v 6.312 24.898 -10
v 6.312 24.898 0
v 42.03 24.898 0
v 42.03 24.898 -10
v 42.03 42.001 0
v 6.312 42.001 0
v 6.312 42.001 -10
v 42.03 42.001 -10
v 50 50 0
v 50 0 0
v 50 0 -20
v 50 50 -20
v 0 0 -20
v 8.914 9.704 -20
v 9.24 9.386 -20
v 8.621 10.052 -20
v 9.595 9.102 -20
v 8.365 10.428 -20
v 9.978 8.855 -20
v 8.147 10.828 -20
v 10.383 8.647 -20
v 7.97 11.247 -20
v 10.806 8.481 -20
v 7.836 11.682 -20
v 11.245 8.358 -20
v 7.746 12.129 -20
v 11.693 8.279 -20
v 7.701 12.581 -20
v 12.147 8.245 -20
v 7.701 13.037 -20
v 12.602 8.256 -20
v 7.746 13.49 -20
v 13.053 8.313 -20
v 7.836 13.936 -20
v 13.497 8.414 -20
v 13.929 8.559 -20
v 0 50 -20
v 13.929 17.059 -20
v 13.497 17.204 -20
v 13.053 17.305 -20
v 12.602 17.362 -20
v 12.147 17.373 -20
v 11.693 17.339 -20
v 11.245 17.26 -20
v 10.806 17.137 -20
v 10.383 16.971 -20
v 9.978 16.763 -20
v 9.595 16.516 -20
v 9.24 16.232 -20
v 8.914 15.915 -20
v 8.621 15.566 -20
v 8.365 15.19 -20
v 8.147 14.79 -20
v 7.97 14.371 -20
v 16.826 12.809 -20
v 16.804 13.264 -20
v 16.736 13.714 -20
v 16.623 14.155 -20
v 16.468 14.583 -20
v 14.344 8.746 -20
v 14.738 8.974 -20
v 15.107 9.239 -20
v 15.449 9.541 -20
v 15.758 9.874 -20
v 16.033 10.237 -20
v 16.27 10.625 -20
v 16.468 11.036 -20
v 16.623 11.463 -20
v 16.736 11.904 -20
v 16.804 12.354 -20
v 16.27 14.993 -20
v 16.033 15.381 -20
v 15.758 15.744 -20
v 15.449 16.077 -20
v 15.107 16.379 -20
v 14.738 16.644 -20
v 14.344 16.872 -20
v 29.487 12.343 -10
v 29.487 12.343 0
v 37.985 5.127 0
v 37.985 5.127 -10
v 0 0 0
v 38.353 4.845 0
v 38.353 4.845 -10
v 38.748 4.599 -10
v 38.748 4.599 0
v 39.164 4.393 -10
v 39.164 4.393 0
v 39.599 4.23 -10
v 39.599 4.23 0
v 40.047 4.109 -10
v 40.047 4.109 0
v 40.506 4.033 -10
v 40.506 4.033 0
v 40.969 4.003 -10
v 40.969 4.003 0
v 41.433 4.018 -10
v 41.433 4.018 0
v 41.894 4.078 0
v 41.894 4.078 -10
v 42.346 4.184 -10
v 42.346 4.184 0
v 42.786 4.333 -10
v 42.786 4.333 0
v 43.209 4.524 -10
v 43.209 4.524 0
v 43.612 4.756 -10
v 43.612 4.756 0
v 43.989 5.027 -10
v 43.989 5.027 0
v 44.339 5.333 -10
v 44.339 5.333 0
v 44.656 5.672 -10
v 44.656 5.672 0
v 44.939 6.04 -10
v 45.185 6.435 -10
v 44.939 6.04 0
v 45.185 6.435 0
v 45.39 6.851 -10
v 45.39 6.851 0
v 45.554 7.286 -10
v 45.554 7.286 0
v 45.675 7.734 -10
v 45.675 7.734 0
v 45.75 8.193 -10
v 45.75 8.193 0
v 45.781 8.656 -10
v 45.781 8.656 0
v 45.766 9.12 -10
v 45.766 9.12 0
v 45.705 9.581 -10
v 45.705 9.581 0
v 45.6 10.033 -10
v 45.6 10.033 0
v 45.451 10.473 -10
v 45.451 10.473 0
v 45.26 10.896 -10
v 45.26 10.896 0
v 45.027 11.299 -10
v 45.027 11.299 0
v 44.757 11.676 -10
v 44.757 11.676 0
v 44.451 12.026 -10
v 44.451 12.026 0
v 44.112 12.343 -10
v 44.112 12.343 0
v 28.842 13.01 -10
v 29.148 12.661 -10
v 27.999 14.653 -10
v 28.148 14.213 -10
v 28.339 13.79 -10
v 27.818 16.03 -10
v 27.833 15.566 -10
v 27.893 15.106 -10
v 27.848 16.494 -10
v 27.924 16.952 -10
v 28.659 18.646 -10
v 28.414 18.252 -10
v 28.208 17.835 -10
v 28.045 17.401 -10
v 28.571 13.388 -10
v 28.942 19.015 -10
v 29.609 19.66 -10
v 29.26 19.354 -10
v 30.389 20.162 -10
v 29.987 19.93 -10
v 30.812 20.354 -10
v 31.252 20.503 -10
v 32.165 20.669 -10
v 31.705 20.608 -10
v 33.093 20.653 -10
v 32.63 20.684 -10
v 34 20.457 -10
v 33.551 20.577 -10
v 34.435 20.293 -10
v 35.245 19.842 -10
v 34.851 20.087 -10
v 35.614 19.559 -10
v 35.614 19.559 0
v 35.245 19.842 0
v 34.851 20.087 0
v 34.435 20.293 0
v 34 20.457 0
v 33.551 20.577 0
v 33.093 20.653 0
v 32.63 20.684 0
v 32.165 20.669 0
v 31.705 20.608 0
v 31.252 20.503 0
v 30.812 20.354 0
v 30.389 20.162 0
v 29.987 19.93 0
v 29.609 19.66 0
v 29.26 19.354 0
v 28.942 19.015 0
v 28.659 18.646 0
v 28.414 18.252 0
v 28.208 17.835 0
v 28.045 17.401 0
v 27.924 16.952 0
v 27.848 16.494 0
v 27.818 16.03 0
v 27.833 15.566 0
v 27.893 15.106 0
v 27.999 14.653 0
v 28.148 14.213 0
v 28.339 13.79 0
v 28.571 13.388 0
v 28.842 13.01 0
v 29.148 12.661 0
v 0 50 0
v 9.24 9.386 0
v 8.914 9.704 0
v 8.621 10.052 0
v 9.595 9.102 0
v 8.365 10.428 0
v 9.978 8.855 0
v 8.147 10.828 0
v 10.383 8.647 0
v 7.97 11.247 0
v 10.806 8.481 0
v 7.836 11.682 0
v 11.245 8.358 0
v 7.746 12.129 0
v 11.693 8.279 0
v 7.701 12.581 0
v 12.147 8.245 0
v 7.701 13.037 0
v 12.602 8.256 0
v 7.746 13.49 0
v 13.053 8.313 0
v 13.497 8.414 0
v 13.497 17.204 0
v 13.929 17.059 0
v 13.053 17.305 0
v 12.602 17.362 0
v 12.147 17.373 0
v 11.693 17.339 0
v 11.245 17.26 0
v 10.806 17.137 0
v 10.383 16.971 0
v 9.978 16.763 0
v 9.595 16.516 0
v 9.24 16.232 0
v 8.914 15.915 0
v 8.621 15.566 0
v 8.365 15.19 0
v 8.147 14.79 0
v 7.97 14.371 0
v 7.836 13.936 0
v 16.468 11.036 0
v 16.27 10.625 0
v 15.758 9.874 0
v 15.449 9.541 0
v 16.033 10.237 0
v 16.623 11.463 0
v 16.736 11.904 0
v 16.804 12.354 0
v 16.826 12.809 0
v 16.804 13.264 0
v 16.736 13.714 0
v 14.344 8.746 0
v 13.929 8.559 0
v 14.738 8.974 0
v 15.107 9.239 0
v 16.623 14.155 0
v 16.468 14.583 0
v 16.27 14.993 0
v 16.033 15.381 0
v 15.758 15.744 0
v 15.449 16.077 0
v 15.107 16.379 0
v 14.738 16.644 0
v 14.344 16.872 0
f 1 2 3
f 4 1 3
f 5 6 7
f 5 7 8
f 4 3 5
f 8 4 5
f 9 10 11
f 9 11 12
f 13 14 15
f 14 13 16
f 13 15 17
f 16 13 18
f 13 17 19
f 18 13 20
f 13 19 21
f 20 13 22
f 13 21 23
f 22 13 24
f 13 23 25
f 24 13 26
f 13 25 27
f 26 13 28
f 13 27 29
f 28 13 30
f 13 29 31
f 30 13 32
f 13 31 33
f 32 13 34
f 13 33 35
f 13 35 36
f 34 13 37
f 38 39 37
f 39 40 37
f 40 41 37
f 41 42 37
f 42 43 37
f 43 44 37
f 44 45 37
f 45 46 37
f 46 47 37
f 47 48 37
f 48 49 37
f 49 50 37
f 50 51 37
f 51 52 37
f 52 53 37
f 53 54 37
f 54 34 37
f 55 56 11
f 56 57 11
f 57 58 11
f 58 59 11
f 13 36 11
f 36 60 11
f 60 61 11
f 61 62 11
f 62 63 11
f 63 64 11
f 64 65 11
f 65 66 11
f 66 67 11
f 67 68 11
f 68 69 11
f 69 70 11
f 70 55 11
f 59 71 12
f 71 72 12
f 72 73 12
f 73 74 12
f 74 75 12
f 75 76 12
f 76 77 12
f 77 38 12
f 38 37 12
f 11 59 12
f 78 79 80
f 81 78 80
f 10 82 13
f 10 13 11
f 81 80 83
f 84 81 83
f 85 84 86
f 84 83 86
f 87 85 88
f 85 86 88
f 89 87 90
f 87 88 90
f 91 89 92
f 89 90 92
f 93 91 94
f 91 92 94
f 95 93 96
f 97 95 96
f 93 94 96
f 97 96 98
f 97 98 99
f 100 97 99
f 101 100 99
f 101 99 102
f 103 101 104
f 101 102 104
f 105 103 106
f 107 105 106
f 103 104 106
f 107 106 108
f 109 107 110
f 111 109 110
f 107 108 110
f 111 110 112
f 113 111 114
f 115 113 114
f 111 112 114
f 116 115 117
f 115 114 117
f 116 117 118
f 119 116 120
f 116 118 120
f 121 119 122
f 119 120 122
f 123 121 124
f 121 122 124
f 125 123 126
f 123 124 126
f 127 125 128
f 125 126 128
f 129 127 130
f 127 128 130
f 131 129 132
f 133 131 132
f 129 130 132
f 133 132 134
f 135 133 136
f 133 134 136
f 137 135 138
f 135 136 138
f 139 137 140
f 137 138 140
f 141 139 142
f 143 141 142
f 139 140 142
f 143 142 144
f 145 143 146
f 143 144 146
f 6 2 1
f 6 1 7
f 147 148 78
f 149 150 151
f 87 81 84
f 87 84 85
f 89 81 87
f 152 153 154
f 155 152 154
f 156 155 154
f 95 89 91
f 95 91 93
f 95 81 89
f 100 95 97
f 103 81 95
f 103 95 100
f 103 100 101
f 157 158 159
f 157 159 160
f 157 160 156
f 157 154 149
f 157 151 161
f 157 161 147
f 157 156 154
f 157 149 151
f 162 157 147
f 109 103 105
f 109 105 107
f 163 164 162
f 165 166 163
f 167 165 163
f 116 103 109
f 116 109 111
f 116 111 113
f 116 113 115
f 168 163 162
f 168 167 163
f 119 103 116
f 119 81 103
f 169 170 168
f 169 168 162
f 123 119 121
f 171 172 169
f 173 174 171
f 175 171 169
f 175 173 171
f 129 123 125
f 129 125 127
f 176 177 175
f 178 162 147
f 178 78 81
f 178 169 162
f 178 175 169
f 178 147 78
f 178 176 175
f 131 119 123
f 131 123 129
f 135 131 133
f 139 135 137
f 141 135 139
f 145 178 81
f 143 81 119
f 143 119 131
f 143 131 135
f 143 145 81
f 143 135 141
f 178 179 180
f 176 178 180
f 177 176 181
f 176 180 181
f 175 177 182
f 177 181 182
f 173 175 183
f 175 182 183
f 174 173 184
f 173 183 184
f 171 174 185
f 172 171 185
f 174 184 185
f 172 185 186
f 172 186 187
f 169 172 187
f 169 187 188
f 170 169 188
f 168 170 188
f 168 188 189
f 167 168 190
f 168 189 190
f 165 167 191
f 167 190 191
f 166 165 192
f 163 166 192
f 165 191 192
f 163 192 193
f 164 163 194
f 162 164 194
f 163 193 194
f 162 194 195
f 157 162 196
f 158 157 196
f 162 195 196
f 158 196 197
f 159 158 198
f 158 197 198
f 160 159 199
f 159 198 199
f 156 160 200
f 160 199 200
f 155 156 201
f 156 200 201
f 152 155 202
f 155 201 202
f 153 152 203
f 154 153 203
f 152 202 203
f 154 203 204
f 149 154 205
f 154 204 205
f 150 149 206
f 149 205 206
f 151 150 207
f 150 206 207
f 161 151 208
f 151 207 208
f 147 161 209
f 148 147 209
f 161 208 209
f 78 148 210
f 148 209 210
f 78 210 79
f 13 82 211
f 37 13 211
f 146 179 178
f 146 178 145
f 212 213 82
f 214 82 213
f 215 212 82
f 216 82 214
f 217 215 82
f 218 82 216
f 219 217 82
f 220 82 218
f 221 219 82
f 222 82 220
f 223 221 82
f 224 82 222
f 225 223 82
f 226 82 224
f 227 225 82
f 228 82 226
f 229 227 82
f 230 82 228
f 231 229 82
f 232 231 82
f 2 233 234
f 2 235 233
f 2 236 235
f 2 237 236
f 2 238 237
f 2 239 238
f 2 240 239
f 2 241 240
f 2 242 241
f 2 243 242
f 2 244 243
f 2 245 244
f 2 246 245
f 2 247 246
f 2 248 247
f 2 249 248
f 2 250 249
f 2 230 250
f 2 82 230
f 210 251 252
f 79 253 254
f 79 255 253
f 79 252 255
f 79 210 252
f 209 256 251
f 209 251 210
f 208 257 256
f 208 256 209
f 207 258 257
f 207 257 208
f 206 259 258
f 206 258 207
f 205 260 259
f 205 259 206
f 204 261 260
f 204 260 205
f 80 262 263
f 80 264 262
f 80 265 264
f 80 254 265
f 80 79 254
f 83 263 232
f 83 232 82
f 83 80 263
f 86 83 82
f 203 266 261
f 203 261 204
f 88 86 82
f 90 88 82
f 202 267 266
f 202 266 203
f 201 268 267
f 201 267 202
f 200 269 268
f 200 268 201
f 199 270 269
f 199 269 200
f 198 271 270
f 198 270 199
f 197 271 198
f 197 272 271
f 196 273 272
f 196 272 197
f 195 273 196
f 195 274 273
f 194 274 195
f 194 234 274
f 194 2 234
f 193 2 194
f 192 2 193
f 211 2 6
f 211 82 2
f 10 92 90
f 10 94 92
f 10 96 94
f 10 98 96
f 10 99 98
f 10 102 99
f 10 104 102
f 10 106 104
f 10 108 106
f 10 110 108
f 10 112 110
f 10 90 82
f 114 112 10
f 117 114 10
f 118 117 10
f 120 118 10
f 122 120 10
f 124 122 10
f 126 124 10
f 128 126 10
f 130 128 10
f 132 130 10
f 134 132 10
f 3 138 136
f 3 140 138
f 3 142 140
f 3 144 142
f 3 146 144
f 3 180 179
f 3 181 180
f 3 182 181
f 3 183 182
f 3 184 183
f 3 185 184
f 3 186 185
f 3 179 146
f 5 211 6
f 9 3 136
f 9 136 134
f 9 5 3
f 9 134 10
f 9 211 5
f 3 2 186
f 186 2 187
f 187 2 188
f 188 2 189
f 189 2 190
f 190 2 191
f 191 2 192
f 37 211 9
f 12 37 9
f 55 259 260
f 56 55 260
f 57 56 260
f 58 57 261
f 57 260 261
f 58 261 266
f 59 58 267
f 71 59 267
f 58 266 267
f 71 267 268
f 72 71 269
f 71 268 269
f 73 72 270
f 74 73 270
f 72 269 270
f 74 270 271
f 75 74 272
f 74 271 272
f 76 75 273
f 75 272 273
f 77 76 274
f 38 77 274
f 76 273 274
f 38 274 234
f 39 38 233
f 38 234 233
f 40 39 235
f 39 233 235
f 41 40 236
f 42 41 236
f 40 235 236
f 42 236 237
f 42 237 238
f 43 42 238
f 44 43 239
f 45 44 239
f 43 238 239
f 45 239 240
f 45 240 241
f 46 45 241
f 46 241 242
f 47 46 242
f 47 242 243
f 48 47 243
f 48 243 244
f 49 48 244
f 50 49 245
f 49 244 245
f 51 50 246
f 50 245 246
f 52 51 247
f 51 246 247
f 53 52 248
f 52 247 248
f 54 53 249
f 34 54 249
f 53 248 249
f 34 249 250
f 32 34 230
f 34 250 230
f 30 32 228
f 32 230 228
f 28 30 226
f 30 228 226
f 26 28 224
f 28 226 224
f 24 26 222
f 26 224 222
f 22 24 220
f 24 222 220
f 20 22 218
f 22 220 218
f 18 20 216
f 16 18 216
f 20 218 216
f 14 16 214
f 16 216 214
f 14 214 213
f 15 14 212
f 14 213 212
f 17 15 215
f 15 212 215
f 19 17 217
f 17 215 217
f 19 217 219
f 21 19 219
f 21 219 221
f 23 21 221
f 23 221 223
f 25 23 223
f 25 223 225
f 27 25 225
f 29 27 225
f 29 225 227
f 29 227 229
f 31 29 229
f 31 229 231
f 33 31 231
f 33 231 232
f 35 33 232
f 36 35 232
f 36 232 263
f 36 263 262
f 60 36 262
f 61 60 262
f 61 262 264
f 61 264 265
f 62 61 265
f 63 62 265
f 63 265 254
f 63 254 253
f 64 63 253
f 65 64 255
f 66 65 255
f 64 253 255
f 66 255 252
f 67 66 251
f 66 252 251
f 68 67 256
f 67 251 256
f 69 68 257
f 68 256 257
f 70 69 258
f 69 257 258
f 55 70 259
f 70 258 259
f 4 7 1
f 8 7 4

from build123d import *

# Parameters (mm, degrees)
SKETCH_W        = 50
SKETCH_H        = 50
SKETCH_R        = 4.56572
PAD_DEPTH       = 20
SKETCH001_W     = 35.718838
SKETCH001_H     = 17.102667
POCKET_DEPTH    = 10
POCKET001_DEPTH = 10


with BuildPart() as part:
    # Sketch → Pad (new body)
    with BuildSketch(Plane.XY):
        Rectangle(SKETCH_W, SKETCH_H)
        with Locations((-12.739399, -12.190962)):
            Circle(SKETCH_R, mode=Mode.SUBTRACT)
    extrude(amount=-PAD_DEPTH)

    # Sketch001 → Pocket (cut)
    with BuildSketch(Plane.XY):
        with Locations((-0.828983, 8.449547)):
            Rectangle(SKETCH001_W, SKETCH001_H)
    extrude(amount=-POCKET_DEPTH, mode=Mode.SUBTRACT)

    # Sketch002 → Pocket001 (cut)
    with BuildSketch(Plane.XY):
        with BuildLine():
            ThreePointArc((10.613772, -5.440841), (3.942315, -5.985276), (4.48675, -12.656733))
            Line((4.48675, -12.656733), (12.984974, -19.872584))
            ThreePointArc((12.984974, -19.872584), (19.656431, -19.328148), (19.111996, -12.656692))
            Line((10.613772, -5.440841), (19.111996, -12.656692))
        make_face()
    extrude(amount=-POCKET001_DEPTH, mode=Mode.SUBTRACT)


with BuildPart() as part_1:
    # Clone placement: moved
    add(part.part.moved(Location((25, 25, 0))))


solid = part_1.part
